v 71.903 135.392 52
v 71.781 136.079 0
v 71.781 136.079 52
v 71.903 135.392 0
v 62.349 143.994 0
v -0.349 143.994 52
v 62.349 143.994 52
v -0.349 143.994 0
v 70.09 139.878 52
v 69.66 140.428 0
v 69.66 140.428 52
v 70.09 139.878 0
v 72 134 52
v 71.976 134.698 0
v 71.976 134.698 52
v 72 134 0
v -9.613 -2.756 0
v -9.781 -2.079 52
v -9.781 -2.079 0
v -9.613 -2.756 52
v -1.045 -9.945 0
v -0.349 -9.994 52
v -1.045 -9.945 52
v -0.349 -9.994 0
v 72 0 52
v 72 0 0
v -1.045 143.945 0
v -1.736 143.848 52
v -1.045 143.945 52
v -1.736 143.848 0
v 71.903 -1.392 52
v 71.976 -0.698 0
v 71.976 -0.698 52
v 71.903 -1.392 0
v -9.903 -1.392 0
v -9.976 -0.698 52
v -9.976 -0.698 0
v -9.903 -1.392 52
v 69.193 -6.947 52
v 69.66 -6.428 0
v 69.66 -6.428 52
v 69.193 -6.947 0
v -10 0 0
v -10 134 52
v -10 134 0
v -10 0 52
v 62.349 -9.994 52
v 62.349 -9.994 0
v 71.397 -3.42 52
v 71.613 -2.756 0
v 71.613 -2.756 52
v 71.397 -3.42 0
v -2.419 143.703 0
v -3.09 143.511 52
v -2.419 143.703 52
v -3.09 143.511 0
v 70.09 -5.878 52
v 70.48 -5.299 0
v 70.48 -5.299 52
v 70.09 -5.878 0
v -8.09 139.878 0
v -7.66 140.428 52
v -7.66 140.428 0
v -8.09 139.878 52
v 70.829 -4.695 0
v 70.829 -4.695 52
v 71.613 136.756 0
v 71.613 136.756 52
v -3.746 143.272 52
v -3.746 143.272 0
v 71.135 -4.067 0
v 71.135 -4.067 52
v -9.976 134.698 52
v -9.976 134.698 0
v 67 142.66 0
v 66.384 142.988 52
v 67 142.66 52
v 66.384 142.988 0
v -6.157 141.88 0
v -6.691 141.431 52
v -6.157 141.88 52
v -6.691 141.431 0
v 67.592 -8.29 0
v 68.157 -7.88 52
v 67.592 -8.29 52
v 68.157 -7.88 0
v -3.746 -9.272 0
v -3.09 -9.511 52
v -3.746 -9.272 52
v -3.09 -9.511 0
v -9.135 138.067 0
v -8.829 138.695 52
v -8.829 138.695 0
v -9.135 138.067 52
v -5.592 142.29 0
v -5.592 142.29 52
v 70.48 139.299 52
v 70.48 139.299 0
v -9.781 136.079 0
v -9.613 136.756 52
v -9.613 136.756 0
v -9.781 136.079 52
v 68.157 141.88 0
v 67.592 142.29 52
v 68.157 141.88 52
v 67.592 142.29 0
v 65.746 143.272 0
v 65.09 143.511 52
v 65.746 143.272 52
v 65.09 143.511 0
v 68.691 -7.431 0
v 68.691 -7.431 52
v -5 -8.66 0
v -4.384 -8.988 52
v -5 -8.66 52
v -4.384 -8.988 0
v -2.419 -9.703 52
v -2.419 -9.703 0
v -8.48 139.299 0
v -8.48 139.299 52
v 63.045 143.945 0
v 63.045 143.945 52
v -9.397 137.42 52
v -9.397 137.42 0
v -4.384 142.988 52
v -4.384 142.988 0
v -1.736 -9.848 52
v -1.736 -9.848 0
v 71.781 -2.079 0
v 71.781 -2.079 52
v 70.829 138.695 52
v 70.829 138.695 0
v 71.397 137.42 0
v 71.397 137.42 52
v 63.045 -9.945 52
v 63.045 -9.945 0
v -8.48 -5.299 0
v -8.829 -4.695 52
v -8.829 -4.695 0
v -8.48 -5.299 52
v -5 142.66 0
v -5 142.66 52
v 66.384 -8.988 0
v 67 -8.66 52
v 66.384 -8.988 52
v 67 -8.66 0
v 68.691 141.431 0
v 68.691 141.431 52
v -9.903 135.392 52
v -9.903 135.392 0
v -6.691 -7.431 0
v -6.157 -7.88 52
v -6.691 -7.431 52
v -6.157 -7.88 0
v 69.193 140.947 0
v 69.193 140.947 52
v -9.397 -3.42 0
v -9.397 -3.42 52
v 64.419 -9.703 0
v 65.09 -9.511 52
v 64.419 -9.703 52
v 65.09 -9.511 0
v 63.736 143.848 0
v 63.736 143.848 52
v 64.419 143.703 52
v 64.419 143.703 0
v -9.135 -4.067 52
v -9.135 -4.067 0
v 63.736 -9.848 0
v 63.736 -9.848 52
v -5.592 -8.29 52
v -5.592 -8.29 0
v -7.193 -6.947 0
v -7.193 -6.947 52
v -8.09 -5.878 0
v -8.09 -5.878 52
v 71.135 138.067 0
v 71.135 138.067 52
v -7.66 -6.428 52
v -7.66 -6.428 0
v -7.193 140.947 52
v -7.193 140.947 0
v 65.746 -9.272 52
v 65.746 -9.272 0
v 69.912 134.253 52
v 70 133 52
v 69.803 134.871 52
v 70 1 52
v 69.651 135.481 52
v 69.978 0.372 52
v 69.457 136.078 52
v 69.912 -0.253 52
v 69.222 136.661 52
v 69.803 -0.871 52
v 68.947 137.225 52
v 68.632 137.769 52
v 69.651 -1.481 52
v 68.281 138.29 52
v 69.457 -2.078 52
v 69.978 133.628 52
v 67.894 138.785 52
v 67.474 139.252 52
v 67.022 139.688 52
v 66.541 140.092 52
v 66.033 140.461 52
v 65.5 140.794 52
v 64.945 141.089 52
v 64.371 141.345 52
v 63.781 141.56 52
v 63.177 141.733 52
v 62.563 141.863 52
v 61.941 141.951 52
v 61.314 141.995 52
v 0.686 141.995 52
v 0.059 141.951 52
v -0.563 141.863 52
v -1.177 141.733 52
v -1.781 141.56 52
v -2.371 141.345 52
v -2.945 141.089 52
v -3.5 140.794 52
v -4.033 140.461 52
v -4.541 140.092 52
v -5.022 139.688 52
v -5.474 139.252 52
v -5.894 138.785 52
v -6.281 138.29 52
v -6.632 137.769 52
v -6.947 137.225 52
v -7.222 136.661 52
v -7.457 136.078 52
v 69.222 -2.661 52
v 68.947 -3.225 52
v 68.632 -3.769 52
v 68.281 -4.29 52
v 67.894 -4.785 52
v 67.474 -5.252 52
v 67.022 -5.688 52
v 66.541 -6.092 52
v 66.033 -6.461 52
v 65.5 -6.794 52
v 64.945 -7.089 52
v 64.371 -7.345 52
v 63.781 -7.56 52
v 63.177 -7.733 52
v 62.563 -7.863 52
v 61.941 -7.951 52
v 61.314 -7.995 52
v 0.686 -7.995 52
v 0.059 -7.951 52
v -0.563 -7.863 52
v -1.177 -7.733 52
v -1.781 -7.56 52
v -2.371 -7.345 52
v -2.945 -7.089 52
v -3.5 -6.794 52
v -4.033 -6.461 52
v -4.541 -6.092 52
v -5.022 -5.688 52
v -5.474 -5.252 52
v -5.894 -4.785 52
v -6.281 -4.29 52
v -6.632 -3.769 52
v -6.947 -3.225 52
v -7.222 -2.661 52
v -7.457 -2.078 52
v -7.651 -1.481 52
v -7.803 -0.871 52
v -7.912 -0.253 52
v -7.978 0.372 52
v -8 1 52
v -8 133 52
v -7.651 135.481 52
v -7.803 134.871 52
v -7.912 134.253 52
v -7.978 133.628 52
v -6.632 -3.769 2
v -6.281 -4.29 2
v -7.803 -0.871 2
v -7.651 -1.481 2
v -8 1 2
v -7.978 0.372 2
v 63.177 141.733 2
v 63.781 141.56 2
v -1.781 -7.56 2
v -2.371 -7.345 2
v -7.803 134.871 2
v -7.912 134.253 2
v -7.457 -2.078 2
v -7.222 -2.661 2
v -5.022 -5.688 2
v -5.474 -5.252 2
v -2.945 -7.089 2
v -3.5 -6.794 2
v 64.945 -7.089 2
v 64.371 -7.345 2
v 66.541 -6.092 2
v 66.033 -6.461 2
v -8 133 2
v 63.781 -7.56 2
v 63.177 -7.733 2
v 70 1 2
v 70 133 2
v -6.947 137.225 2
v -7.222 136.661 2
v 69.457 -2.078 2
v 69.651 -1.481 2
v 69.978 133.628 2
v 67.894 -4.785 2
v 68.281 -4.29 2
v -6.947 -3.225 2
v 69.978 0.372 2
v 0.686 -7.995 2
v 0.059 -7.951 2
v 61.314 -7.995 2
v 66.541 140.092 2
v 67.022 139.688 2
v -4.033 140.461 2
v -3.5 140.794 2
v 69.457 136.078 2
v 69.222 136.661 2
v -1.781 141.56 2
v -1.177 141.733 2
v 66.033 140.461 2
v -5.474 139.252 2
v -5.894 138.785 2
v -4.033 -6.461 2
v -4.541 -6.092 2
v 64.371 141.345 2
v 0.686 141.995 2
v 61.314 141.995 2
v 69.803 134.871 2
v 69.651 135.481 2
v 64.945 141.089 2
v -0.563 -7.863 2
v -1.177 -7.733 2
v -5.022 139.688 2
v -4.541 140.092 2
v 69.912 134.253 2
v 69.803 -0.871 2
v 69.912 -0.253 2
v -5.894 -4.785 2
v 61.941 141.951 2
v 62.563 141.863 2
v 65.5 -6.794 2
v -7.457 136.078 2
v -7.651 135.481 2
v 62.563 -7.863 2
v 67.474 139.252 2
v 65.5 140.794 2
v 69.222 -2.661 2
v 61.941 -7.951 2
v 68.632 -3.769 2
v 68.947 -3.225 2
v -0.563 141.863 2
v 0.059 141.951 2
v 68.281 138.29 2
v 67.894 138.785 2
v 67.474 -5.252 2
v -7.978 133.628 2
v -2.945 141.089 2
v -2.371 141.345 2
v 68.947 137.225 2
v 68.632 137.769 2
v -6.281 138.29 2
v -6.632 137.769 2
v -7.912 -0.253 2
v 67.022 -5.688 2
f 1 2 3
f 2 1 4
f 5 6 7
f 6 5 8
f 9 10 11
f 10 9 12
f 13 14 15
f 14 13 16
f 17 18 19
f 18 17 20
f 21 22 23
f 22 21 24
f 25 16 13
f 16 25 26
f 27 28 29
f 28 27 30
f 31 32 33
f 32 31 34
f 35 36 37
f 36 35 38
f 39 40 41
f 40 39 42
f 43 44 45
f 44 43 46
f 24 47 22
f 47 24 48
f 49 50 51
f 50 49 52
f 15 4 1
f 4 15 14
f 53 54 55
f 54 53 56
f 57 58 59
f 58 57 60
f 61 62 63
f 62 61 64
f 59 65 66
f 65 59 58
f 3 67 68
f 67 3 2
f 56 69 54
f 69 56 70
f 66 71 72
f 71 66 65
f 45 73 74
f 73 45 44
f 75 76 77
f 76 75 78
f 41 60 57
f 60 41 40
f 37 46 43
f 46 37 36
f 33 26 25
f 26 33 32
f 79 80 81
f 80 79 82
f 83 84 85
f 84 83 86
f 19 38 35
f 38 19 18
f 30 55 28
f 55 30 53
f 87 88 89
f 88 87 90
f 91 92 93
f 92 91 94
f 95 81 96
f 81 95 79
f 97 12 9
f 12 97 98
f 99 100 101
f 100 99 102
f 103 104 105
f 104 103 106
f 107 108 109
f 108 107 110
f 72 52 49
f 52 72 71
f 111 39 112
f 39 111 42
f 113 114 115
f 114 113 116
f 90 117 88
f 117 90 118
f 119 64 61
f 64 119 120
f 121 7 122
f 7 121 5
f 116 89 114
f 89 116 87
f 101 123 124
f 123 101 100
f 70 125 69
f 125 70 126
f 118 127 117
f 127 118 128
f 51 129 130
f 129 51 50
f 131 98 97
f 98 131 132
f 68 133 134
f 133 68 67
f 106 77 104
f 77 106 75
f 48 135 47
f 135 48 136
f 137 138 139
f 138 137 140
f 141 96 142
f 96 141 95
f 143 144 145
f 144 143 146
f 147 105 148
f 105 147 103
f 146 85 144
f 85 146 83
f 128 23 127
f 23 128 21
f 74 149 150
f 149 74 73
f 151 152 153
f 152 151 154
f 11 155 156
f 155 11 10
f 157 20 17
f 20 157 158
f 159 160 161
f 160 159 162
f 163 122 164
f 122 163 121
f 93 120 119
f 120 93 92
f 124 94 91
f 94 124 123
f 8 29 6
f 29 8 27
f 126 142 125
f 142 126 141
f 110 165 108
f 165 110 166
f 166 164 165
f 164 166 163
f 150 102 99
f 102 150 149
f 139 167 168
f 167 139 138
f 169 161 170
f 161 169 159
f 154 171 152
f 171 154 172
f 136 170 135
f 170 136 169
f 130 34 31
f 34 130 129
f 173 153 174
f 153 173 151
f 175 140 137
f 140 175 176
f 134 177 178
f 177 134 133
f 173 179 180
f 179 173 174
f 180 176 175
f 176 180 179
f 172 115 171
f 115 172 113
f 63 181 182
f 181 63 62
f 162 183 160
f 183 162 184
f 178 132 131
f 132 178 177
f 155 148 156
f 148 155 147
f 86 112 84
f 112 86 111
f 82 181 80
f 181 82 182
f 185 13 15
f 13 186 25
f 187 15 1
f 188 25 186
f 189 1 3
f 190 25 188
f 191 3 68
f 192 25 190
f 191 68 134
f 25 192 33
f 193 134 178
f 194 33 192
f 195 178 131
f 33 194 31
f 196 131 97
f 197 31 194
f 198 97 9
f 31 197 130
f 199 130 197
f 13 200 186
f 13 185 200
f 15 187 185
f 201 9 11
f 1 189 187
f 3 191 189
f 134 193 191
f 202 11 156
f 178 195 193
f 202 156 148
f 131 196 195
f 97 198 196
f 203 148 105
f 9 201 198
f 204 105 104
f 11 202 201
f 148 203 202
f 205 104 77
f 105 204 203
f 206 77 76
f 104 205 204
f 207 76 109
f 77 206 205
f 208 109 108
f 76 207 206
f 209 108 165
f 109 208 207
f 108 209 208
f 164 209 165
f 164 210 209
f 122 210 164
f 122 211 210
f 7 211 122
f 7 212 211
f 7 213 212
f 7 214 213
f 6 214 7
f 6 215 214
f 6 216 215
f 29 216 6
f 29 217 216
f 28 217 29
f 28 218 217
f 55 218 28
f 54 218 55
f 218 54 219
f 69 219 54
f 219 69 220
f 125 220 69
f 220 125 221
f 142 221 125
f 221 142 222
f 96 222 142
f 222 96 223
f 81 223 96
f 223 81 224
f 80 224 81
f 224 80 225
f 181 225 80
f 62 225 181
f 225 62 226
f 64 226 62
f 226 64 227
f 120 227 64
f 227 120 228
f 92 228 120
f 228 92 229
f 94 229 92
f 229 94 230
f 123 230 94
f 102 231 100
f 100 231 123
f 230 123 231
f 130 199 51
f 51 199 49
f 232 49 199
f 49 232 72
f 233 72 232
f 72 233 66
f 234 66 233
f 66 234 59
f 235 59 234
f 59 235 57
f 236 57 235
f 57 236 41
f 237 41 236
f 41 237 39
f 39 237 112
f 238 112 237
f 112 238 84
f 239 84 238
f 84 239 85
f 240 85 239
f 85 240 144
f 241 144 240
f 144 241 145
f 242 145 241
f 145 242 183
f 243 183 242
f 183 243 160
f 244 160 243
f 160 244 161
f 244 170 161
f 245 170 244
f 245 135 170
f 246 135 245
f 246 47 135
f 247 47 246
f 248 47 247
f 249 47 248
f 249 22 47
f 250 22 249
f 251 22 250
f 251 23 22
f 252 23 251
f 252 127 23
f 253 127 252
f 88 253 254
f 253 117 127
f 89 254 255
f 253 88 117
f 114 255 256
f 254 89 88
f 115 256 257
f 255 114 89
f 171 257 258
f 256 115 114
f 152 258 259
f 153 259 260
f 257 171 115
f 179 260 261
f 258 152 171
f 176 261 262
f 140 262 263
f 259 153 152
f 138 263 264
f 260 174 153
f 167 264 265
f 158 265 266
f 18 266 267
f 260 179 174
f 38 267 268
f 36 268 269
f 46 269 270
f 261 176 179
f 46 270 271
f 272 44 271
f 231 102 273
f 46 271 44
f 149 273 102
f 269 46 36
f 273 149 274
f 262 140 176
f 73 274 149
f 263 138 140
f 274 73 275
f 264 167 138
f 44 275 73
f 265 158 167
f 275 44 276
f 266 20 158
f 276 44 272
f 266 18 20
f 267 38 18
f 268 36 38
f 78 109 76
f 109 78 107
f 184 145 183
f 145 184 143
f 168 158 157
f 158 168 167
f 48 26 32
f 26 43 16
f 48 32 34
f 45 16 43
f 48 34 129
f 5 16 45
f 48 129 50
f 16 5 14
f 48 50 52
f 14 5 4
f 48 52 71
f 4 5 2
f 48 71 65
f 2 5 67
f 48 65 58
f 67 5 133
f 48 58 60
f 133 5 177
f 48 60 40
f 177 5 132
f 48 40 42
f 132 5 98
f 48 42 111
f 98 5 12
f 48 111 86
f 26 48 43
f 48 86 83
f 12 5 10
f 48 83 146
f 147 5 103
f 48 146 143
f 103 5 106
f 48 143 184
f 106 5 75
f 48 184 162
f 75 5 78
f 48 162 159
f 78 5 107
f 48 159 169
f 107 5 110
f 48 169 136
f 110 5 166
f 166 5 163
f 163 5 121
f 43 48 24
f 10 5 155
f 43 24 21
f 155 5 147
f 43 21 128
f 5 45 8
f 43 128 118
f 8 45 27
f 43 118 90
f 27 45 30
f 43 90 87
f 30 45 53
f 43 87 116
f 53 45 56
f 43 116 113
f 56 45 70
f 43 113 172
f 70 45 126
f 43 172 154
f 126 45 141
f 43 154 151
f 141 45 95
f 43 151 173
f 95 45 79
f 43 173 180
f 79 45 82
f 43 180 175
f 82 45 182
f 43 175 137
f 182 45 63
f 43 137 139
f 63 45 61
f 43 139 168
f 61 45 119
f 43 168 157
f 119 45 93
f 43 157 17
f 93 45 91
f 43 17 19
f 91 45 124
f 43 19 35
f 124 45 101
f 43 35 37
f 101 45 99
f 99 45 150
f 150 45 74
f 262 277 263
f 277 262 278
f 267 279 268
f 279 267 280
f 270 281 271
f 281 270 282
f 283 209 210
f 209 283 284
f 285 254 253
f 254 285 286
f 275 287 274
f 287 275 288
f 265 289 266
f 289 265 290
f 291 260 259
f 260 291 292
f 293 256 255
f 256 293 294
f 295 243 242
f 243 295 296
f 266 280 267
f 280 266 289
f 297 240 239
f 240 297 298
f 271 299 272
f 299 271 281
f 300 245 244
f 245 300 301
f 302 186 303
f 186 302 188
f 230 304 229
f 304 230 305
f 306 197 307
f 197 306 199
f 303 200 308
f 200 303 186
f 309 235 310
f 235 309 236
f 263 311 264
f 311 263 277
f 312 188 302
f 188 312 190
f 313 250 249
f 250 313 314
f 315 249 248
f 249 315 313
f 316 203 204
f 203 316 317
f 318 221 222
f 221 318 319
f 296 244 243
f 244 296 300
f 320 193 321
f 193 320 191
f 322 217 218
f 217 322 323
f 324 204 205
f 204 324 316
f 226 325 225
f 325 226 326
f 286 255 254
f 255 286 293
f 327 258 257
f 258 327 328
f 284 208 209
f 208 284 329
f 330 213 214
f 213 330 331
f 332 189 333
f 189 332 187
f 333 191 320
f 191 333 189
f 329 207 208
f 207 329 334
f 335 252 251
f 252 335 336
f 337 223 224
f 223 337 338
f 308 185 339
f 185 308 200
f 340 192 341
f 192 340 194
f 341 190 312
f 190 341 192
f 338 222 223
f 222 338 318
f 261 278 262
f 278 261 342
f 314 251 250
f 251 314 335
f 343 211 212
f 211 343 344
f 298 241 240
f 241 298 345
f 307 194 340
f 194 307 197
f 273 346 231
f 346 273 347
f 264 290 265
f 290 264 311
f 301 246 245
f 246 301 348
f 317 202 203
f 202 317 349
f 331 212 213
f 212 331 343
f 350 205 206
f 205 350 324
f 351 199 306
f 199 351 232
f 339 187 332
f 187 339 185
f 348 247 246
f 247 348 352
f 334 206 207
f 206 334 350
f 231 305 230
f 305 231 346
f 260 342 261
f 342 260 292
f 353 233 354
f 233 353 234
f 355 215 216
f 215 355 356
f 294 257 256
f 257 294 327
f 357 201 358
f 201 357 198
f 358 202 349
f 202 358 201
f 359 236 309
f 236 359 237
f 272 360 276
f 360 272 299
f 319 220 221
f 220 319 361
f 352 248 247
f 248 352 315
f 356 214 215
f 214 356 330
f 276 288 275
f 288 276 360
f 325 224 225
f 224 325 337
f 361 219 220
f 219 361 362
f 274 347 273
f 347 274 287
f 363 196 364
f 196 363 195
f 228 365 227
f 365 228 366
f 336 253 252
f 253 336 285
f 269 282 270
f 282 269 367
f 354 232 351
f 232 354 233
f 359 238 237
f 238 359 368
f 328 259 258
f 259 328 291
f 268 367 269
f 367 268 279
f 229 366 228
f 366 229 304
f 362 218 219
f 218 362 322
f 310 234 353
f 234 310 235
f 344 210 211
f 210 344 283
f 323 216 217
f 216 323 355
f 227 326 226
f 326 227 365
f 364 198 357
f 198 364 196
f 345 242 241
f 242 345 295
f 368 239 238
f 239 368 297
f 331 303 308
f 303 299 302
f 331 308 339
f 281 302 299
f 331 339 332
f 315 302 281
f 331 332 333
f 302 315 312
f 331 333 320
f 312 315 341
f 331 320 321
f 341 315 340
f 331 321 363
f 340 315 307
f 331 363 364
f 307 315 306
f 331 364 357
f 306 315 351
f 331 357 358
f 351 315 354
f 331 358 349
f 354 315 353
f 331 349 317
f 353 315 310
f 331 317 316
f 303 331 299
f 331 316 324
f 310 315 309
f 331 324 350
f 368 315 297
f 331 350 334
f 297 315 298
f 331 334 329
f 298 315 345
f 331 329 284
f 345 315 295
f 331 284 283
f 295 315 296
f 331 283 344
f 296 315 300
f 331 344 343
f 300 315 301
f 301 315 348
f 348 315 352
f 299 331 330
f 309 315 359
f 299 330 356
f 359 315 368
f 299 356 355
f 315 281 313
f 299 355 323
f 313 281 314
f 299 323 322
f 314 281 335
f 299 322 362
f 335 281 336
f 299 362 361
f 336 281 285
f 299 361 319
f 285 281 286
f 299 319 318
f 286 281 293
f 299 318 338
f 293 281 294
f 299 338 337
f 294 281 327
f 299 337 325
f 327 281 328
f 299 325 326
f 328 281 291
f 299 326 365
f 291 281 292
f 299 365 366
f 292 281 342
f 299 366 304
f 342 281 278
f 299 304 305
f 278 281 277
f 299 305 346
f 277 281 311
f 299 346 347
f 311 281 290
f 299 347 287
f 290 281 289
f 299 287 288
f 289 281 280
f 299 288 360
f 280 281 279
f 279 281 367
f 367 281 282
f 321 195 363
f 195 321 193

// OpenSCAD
$fn = 90;
module box (x=82,y=154,z=52,d=20,t=2)
{
    A = x-d;
    B = y-d;
    C = z;
    
    //%translate([-d/2,-d/2,0]) cube([x,y,z]);
    difference()
    {
        hull()
        {
            cylinder(d=d, h=C);
            translate([A,0,0]) cylinder(d=d, h=C);
            translate([A,B,0]) cylinder(d=d, h=C);
            translate([0,B,0]) cylinder(d=d, h=C);
        }
        
        translate([-t/2,-t/2,t])
        hull()
        {
            translate([t,t,0]) cylinder(d=d-t, h=C);
            translate([A,t,0]) cylinder(d=d-t, h=C);
            translate([A,B,0]) cylinder(d=d-t, h=C);
            translate([t,B,0]) cylinder(d=d-t, h=C);
        }
    }
}

box();

module double_box()
{
    box(x=2*82,y=154,z=52,d=20,t=2);
}

//double_box();
